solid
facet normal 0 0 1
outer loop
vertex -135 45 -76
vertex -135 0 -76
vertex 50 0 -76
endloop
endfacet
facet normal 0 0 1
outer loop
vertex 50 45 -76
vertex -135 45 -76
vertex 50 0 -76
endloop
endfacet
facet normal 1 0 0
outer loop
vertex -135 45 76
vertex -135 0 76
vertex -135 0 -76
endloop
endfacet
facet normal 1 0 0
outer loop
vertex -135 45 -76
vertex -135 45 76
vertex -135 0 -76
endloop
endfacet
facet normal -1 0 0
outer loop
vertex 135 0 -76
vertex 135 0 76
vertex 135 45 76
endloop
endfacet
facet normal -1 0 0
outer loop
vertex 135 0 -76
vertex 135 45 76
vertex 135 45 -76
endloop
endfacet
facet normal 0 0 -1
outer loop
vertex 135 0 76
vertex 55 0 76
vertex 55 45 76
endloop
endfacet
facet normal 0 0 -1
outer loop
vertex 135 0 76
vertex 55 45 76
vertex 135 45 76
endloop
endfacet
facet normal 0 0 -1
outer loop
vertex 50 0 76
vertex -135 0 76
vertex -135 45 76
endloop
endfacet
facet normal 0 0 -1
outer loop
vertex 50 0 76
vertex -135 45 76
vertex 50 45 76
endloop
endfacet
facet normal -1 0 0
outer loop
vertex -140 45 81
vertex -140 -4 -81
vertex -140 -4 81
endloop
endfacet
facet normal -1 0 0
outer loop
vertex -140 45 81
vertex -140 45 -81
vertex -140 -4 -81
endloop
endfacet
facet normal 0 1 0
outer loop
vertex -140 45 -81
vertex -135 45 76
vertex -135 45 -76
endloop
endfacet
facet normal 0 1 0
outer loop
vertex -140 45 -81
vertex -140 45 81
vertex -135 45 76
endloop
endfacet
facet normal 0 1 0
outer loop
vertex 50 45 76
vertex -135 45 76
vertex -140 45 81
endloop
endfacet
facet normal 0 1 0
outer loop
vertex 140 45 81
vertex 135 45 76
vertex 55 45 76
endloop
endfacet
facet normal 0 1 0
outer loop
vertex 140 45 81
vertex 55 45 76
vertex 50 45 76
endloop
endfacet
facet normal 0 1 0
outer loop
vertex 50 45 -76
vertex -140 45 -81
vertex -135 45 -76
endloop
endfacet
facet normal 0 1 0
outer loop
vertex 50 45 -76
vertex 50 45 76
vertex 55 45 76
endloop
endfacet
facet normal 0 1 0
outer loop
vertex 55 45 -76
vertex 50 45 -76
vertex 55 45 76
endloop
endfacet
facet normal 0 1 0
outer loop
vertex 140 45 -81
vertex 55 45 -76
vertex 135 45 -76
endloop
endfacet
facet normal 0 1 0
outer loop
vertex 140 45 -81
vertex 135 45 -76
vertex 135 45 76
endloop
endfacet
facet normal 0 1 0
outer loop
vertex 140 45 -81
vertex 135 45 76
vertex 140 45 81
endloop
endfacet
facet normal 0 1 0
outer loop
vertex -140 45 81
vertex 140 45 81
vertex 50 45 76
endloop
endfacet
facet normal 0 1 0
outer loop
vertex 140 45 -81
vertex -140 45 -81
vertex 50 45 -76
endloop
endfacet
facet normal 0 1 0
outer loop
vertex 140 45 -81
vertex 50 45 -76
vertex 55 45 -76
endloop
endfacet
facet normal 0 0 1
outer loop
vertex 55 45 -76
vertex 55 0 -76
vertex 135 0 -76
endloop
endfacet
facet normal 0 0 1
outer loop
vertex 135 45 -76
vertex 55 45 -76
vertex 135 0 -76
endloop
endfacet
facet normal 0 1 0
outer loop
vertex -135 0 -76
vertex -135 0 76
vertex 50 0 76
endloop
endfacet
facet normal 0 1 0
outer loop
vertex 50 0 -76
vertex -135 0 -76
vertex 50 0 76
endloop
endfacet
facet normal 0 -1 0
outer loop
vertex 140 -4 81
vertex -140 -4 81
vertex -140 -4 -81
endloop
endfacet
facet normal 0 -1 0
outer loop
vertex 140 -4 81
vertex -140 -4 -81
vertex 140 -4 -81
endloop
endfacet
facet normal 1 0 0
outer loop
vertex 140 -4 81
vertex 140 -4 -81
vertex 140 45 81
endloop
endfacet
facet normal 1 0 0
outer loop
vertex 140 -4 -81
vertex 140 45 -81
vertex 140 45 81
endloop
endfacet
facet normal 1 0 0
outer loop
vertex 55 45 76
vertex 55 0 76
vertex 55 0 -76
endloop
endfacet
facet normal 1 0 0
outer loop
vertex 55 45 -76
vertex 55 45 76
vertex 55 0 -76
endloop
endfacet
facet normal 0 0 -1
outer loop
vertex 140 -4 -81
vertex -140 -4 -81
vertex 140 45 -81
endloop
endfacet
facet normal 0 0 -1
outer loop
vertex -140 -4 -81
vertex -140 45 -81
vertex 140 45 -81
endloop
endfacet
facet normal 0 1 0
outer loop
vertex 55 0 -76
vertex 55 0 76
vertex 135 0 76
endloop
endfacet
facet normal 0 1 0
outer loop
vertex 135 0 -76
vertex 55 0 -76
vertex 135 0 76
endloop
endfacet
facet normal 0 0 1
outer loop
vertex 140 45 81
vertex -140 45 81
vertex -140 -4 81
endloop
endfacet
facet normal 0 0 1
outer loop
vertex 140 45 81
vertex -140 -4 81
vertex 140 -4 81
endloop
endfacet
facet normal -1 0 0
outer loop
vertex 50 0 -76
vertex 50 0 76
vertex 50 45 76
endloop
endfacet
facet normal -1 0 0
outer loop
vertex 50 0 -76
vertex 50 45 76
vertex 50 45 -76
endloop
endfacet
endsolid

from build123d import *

# Parameters (mm, degrees)
CROQUIS1_W              = 280
CROQUIS1_H              = 162
CROQUIS1_W_2            = 270
CROQUIS1_H_2            = 152
SALIENTE_EXTRUIR1_DEPTH = 45
CROQUIS3_W              = 280
CROQUIS3_H              = 162
SALIENTE_EXTRUIR2_DEPTH = 4
CROQUIS4_W              = 5
CROQUIS4_H              = 152
SALIENTE_EXTRUIR3_DEPTH = 45


with BuildPart() as part:
    # Croquis1 → Saliente-Extruir1 (new body)
    with BuildSketch(Plane(origin=(0, 0, 0), x_dir=(1, 0, 0), z_dir=(0, 1, 0))):
        Rectangle(CROQUIS1_W, CROQUIS1_H)
        Rectangle(CROQUIS1_W_2, CROQUIS1_H_2, mode=Mode.SUBTRACT)
    extrude(amount=SALIENTE_EXTRUIR1_DEPTH)

    # Croquis3 → Saliente-Extruir2 (add)
    with BuildSketch(Plane.XZ):
        Rectangle(CROQUIS3_W, CROQUIS3_H)
    extrude(amount=SALIENTE_EXTRUIR2_DEPTH)

    # Croquis4 → Saliente-Extruir3 (add)
    with BuildSketch(Plane(origin=(0, 0, 0), x_dir=(1, 0, 0), z_dir=(0, 1, 0))):
        with Locations((52.5, 0)):
            Rectangle(CROQUIS4_W, CROQUIS4_H)
    extrude(amount=SALIENTE_EXTRUIR3_DEPTH)


solid = part.part
